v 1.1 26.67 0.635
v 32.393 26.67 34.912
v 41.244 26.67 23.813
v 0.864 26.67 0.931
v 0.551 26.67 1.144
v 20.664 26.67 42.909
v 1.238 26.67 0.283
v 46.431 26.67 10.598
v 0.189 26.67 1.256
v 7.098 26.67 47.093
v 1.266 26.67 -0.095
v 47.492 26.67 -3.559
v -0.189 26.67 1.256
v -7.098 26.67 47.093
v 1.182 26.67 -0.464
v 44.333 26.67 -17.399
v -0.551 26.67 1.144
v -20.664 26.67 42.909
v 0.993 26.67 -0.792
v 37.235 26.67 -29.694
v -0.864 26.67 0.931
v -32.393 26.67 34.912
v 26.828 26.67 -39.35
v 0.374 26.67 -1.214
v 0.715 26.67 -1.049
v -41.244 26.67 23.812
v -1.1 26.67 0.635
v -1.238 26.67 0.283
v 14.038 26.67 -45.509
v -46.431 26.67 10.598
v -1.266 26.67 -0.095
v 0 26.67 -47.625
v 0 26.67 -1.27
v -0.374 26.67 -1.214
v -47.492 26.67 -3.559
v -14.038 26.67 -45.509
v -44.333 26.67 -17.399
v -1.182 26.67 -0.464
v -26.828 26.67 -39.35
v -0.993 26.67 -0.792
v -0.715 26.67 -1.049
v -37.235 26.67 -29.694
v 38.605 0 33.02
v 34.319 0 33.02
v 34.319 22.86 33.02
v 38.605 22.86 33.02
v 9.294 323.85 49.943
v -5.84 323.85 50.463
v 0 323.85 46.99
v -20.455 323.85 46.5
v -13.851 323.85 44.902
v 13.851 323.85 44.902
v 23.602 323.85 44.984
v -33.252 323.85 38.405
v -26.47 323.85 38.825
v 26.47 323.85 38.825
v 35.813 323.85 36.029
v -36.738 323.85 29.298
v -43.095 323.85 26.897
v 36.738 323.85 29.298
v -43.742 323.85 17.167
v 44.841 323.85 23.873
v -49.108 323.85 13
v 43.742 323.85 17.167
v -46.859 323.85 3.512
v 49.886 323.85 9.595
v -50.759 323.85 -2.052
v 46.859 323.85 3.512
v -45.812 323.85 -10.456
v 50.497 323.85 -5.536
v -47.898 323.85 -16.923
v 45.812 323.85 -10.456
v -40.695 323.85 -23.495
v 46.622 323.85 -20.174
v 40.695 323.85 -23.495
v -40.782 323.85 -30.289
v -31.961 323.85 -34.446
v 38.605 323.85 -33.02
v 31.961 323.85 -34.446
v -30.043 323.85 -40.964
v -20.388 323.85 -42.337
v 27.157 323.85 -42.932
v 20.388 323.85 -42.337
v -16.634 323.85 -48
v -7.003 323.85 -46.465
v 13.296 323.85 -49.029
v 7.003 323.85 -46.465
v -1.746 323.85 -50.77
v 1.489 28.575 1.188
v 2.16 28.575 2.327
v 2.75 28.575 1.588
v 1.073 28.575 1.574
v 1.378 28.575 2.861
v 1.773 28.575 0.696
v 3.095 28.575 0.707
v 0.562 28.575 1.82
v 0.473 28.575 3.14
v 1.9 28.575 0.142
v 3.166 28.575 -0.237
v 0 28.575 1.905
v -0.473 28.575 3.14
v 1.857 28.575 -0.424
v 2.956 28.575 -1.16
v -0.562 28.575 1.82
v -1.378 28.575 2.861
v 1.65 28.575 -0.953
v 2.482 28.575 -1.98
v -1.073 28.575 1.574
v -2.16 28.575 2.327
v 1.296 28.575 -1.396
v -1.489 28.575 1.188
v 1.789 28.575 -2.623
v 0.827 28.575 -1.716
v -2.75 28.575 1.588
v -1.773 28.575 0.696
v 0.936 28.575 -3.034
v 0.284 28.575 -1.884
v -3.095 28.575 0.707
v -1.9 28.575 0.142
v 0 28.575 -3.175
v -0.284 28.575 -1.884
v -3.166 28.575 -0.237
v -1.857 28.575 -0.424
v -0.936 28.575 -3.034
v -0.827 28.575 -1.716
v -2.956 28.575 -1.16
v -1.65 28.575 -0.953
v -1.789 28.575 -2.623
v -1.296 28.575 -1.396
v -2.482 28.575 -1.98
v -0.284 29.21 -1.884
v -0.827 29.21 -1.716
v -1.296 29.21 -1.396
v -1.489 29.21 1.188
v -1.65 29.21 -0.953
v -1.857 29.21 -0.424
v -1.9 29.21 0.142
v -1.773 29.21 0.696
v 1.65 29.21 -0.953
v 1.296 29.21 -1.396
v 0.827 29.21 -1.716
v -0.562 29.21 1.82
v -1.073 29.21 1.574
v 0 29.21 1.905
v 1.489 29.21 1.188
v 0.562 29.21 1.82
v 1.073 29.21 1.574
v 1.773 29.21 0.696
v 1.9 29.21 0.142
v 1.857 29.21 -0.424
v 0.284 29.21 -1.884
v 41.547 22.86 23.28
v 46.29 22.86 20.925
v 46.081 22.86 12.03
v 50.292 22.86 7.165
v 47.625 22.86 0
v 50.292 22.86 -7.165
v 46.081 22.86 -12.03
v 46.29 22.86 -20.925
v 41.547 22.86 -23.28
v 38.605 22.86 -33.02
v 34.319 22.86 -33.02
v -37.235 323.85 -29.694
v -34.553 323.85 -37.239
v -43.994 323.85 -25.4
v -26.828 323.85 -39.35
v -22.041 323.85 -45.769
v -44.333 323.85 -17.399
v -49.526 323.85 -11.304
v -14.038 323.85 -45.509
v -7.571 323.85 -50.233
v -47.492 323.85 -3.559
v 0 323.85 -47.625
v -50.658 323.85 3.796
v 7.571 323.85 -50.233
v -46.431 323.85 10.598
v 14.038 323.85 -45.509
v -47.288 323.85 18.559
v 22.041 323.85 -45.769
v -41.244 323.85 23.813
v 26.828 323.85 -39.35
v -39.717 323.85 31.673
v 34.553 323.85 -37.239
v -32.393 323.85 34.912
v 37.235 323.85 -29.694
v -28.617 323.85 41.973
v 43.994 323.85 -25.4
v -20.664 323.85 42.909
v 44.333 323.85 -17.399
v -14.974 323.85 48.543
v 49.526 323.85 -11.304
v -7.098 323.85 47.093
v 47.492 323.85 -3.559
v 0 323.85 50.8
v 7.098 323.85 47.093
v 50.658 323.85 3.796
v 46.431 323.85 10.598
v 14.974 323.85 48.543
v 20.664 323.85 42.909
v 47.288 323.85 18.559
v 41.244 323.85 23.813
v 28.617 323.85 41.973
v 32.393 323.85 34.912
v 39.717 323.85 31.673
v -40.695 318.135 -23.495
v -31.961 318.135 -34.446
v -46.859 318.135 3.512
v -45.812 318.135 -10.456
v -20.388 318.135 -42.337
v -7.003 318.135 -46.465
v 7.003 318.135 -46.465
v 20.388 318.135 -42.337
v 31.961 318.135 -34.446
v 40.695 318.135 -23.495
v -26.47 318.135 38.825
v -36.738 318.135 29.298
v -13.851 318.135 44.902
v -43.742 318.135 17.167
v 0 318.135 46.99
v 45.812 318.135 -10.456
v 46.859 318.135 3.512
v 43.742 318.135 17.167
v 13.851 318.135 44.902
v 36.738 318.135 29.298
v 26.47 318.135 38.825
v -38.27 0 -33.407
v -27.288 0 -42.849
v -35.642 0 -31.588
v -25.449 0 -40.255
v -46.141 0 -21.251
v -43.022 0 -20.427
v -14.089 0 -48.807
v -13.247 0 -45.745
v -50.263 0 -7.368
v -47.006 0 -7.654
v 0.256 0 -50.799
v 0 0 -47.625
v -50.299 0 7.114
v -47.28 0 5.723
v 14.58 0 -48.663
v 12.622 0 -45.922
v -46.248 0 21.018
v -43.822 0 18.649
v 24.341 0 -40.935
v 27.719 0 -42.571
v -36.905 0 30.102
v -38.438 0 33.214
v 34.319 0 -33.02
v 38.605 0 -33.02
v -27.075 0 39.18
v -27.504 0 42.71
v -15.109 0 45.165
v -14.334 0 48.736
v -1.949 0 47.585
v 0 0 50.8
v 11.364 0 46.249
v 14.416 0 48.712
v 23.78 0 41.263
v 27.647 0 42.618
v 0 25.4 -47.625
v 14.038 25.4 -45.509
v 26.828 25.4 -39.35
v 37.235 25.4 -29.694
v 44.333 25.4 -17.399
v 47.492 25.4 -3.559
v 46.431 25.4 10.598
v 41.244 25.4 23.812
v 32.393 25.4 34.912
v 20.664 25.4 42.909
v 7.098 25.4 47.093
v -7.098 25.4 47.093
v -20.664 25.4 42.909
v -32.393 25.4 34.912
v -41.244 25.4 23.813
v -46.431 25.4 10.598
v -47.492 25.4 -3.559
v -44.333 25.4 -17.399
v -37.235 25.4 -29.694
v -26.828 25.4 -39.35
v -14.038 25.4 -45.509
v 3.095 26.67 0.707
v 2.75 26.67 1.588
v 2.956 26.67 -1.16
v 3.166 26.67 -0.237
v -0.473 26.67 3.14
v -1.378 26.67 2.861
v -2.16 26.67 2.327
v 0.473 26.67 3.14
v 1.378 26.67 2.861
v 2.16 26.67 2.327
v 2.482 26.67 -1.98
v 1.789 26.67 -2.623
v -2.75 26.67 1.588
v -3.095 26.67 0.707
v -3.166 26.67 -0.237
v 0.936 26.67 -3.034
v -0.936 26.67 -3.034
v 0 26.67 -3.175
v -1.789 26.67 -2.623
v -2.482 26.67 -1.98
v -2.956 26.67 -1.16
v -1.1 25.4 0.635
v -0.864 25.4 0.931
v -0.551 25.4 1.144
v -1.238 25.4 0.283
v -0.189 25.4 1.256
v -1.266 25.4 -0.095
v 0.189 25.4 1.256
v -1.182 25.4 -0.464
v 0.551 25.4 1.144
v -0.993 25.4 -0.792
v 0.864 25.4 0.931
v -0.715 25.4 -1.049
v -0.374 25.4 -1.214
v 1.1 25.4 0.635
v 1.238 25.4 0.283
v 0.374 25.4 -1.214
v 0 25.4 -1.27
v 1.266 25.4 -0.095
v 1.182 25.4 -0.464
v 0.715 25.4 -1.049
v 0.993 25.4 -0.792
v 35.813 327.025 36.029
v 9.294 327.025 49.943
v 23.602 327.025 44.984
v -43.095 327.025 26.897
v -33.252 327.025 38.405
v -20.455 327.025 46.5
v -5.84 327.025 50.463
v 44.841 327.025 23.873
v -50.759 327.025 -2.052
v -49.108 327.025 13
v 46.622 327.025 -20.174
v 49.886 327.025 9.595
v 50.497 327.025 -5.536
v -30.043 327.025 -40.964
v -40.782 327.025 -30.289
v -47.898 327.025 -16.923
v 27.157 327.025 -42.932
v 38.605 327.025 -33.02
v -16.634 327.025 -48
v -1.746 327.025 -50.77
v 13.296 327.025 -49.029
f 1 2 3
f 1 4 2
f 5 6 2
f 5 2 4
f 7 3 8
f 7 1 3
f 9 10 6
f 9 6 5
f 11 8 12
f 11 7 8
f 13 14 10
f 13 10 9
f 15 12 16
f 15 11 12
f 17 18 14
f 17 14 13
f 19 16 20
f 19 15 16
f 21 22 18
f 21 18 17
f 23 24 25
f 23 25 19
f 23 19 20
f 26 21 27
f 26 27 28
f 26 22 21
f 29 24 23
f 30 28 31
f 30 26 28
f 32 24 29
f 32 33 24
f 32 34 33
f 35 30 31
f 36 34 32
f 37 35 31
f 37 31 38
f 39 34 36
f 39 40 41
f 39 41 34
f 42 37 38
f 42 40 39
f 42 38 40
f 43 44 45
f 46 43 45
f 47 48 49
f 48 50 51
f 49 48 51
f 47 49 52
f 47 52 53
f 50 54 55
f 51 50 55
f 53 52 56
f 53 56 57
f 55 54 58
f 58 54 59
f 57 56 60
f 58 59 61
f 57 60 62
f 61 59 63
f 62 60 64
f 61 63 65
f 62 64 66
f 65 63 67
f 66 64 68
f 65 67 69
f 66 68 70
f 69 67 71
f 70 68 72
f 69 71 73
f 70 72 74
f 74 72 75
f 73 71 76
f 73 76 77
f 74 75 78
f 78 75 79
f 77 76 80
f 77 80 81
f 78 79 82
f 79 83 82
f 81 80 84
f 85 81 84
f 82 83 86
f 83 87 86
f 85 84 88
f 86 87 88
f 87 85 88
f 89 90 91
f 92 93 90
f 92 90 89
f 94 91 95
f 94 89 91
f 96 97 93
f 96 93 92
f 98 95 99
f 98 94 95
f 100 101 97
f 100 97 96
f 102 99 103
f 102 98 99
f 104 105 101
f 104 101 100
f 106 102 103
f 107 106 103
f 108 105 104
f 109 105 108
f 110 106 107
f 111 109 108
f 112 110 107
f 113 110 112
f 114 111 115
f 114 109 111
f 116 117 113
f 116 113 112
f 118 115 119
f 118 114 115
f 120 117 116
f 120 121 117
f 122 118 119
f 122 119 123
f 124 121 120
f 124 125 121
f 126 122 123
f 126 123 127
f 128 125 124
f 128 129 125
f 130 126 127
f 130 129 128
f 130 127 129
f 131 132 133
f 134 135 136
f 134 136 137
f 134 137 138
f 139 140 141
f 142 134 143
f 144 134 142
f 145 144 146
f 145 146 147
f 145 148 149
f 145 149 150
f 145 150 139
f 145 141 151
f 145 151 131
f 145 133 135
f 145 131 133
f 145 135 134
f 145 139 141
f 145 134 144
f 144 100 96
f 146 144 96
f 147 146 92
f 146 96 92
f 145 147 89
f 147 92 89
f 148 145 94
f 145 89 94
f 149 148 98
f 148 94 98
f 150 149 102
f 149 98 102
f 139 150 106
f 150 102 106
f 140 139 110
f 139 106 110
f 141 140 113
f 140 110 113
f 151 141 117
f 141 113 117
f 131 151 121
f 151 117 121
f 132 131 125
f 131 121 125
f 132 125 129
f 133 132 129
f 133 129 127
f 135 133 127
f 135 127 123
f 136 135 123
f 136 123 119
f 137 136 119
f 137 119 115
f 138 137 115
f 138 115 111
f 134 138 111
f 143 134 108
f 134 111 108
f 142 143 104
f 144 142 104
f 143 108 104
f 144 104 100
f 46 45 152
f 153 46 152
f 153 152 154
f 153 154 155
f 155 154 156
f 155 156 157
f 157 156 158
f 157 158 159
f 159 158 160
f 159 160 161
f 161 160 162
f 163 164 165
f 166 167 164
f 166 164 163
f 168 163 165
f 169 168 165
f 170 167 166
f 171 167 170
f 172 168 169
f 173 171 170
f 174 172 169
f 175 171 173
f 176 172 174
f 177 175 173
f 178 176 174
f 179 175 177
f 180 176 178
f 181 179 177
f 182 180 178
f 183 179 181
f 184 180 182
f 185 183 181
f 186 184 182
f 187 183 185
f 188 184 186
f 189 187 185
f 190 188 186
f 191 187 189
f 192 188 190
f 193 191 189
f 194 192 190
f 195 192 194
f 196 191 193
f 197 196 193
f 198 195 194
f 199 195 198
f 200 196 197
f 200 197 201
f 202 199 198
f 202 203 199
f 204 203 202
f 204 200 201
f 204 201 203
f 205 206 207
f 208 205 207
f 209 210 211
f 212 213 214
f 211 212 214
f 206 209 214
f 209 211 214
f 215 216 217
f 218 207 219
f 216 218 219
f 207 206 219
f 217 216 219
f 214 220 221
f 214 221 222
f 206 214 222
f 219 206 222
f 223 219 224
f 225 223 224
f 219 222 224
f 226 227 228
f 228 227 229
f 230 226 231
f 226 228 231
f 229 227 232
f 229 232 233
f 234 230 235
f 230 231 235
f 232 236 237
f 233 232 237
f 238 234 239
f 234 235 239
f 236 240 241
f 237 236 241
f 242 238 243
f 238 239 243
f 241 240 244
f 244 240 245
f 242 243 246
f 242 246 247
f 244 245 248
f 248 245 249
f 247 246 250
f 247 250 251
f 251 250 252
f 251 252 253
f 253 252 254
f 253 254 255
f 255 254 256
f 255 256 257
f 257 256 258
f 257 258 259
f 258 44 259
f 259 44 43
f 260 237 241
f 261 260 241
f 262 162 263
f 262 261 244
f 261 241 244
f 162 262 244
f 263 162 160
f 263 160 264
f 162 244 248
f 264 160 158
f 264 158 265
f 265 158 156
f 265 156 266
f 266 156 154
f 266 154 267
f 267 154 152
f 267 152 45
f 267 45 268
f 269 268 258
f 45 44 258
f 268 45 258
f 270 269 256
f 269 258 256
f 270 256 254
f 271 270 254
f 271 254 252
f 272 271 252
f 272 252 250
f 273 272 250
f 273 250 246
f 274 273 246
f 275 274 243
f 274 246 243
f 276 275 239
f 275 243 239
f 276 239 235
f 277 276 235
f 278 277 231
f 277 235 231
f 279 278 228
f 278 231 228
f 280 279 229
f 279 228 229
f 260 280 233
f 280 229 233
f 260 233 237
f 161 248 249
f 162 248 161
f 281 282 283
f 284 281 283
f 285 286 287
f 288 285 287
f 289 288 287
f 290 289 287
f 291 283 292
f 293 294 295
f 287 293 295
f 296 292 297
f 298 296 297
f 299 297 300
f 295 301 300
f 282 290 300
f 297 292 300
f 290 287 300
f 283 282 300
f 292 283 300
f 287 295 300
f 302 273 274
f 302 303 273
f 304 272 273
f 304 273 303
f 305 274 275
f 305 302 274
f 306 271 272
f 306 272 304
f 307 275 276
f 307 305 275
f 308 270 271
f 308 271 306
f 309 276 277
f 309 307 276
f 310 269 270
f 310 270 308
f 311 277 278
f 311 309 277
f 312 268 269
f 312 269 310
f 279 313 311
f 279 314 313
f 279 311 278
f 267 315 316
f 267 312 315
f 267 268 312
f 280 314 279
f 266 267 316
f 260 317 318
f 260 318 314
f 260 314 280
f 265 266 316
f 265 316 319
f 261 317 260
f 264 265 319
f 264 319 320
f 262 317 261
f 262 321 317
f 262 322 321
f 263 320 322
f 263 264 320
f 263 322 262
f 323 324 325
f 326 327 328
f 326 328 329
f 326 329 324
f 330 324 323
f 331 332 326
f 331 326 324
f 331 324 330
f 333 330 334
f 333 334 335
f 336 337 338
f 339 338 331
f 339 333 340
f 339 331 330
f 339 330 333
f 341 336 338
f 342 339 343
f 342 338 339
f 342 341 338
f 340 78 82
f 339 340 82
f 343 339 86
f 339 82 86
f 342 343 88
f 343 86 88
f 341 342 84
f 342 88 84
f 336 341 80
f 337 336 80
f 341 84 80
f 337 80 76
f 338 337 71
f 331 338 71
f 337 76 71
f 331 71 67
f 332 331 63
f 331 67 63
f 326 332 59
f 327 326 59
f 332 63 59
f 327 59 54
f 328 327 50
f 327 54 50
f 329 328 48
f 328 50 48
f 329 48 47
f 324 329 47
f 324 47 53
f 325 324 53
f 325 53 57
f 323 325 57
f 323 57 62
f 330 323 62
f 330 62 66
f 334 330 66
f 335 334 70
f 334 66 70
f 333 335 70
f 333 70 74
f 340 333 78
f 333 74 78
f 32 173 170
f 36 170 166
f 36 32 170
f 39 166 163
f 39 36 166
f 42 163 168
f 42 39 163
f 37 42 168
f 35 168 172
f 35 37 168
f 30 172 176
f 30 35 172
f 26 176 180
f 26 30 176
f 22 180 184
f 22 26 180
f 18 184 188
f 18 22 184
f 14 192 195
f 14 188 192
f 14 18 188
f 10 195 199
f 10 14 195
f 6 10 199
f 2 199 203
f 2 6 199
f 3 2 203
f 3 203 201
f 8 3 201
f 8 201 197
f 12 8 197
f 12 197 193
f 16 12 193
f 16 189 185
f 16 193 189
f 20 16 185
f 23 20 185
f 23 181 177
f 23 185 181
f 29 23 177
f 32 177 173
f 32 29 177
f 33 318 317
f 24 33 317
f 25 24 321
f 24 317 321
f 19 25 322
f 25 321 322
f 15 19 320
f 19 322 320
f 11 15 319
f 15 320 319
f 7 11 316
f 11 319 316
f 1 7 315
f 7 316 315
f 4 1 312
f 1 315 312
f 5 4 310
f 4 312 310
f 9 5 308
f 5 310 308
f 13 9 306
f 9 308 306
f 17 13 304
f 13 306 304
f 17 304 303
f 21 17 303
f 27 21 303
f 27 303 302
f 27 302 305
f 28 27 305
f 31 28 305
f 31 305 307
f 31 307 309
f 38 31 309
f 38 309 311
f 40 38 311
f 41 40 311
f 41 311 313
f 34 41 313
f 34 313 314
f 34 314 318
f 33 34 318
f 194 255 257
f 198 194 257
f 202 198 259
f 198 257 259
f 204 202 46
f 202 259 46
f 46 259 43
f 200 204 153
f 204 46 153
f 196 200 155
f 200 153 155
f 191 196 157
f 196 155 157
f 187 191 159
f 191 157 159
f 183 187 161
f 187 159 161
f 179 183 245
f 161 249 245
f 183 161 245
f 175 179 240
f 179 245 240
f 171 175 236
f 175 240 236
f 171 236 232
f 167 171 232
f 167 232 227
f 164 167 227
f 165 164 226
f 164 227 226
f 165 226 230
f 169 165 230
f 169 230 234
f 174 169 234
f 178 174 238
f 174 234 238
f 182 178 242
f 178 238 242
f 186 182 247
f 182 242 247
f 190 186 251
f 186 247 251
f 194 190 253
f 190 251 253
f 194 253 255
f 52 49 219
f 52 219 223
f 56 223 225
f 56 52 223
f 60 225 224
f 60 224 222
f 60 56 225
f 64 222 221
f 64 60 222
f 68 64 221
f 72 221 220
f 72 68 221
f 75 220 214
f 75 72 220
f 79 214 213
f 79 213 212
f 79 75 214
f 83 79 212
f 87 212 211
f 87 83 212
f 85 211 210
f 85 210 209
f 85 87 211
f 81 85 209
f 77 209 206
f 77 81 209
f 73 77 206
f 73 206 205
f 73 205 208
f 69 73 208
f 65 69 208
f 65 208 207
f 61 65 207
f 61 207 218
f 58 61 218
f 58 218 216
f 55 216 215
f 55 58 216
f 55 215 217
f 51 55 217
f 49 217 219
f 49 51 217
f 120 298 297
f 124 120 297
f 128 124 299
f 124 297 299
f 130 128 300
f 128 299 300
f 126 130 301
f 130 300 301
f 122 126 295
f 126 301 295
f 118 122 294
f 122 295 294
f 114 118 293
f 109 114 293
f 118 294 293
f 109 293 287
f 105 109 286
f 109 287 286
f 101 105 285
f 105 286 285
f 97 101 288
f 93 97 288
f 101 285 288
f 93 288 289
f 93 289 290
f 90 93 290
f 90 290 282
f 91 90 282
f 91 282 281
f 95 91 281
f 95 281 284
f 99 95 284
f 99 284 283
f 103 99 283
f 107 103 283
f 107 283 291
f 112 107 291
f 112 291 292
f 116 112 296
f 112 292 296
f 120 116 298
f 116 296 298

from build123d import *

# Parameters (mm, degrees)
SKETCH1_R                = 50.8
BASE_DEPTH               = 323.85
SKETCH3_R                = 47.625
BOTTOM_CUT_DEPTH         = 25.4
SKETCH4_W                = 66.04
SKETCH4_H                = 22.86
BOTTOM_SIDE_DEPTH        = 58.42
SKETCH5_R                = 47.625
INSIDE_CUT_DEPTH         = 306.740465755
SKETCH6_R                = 3.175
RED_ON_BOTTOM_DEPTH      = 1.905
SKETCH7_R                = 1.905
BLACK_ON_RED_DEPTH       = 0.635
SKETCH8_R                = 46.99
CAP_TOP_DEPTH            = 5.715
SKETCH9_R                = 50.8
CAP_BOTTOM_PORTION_DEPTH = 3.175
SKETCH11_R               = 1.27
CONNECTION_CUT_DEPTH     = 1.778


with BuildPart() as part:
    # Sketch1 → Base (new body)
    with BuildSketch(Plane(origin=(0, 0, 0), x_dir=(1, 0, 0), z_dir=(0, 1, 0))):
        with Locations(Location((0, 0, 0), (0, 0, 270))):
            Circle(SKETCH1_R)
    extrude(amount=BASE_DEPTH)

    # Sketch3 → Bottom Cut (cut)
    with BuildSketch(Plane(origin=(0, 0, 0), x_dir=(-1, 0, 0), z_dir=(0, -1, 0))):
        with Locations(Location((0, 0, 0), (0, 0, 90))):
            Circle(SKETCH3_R)
    extrude(amount=-BOTTOM_CUT_DEPTH, mode=Mode.SUBTRACT)

    # Sketch4 → Bottom Side (cut)
    with BuildSketch(Plane(origin=(0, 0, 0), x_dir=(0, 0, -1), z_dir=(1, 0, 0))):
        with Locations((0, 11.43)):
            Rectangle(SKETCH4_W, SKETCH4_H)
    extrude(amount=BOTTOM_SIDE_DEPTH, mode=Mode.SUBTRACT)

    # Sketch5 → Inside Cut (cut, through all)
    with BuildSketch(Plane(origin=(0, 26.67, 0), x_dir=(1, 0, 0), z_dir=(0, 1, 0))):
        with Locations(Location((0, 0, 0), (0, 0, 90))):
            Circle(SKETCH5_R)
    extrude(amount=INSIDE_CUT_DEPTH, mode=Mode.SUBTRACT)

    # Sketch11 → Connection cut (cut)
    with BuildSketch(Plane.XZ.offset(-25.4)):
        with Locations(Location((0, 0, 0), (0, 0, 270))):
            Circle(SKETCH11_R)
    extrude(amount=-CONNECTION_CUT_DEPTH, mode=Mode.SUBTRACT)


with BuildPart() as body_2:
    # Sketch6 → Red on bottom (new body)
    with BuildSketch(Plane(origin=(0, 26.67, 0), x_dir=(1, 0, 0), z_dir=(0, 1, 0))):
        with Locations(Location((0, 0, 0), (0, 0, 90))):
            Circle(SKETCH6_R)
    extrude(amount=RED_ON_BOTTOM_DEPTH)


with BuildPart() as body_3:
    # Sketch7 → Black on red (new body)
    with BuildSketch(Plane(origin=(0, 28.575, 0), x_dir=(1, 0, 0), z_dir=(0, 1, 0))):
        with Locations(Location((0, 0, 0), (0, 0, 270))):
            Circle(SKETCH7_R)
    extrude(amount=BLACK_ON_RED_DEPTH)


with BuildPart() as body_4:
    # Sketch8 → Cap top (new body)
    with BuildSketch(Plane(origin=(0, 323.85, 0), x_dir=(1, 0, 0), z_dir=(0, 1, 0))):
        with Locations(Location((0, 0, 0), (0, 0, 270))):
            Circle(SKETCH8_R)
    extrude(amount=-CAP_TOP_DEPTH)


with BuildPart() as body_5:
    # Sketch9 → cap bottom portion (new body)
    with BuildSketch(Plane(origin=(0, 323.85, 0), x_dir=(1, 0, 0), z_dir=(0, 1, 0))):
        with Locations(Location((0, 0, 0), (0, 0, 40.541601874))):
            Circle(SKETCH9_R)
    extrude(amount=CAP_BOTTOM_PORTION_DEPTH)


with BuildPart() as body_4_1:
    add(body_4.part)

    # Cap Body: union body 5
    add(body_5.part)


with BuildPart() as body_2_1:
    add(body_2.part)

    # Connector Body: union body 3
    add(body_3.part)


solid = Compound([part.part, body_4_1.part, body_2_1.part])
